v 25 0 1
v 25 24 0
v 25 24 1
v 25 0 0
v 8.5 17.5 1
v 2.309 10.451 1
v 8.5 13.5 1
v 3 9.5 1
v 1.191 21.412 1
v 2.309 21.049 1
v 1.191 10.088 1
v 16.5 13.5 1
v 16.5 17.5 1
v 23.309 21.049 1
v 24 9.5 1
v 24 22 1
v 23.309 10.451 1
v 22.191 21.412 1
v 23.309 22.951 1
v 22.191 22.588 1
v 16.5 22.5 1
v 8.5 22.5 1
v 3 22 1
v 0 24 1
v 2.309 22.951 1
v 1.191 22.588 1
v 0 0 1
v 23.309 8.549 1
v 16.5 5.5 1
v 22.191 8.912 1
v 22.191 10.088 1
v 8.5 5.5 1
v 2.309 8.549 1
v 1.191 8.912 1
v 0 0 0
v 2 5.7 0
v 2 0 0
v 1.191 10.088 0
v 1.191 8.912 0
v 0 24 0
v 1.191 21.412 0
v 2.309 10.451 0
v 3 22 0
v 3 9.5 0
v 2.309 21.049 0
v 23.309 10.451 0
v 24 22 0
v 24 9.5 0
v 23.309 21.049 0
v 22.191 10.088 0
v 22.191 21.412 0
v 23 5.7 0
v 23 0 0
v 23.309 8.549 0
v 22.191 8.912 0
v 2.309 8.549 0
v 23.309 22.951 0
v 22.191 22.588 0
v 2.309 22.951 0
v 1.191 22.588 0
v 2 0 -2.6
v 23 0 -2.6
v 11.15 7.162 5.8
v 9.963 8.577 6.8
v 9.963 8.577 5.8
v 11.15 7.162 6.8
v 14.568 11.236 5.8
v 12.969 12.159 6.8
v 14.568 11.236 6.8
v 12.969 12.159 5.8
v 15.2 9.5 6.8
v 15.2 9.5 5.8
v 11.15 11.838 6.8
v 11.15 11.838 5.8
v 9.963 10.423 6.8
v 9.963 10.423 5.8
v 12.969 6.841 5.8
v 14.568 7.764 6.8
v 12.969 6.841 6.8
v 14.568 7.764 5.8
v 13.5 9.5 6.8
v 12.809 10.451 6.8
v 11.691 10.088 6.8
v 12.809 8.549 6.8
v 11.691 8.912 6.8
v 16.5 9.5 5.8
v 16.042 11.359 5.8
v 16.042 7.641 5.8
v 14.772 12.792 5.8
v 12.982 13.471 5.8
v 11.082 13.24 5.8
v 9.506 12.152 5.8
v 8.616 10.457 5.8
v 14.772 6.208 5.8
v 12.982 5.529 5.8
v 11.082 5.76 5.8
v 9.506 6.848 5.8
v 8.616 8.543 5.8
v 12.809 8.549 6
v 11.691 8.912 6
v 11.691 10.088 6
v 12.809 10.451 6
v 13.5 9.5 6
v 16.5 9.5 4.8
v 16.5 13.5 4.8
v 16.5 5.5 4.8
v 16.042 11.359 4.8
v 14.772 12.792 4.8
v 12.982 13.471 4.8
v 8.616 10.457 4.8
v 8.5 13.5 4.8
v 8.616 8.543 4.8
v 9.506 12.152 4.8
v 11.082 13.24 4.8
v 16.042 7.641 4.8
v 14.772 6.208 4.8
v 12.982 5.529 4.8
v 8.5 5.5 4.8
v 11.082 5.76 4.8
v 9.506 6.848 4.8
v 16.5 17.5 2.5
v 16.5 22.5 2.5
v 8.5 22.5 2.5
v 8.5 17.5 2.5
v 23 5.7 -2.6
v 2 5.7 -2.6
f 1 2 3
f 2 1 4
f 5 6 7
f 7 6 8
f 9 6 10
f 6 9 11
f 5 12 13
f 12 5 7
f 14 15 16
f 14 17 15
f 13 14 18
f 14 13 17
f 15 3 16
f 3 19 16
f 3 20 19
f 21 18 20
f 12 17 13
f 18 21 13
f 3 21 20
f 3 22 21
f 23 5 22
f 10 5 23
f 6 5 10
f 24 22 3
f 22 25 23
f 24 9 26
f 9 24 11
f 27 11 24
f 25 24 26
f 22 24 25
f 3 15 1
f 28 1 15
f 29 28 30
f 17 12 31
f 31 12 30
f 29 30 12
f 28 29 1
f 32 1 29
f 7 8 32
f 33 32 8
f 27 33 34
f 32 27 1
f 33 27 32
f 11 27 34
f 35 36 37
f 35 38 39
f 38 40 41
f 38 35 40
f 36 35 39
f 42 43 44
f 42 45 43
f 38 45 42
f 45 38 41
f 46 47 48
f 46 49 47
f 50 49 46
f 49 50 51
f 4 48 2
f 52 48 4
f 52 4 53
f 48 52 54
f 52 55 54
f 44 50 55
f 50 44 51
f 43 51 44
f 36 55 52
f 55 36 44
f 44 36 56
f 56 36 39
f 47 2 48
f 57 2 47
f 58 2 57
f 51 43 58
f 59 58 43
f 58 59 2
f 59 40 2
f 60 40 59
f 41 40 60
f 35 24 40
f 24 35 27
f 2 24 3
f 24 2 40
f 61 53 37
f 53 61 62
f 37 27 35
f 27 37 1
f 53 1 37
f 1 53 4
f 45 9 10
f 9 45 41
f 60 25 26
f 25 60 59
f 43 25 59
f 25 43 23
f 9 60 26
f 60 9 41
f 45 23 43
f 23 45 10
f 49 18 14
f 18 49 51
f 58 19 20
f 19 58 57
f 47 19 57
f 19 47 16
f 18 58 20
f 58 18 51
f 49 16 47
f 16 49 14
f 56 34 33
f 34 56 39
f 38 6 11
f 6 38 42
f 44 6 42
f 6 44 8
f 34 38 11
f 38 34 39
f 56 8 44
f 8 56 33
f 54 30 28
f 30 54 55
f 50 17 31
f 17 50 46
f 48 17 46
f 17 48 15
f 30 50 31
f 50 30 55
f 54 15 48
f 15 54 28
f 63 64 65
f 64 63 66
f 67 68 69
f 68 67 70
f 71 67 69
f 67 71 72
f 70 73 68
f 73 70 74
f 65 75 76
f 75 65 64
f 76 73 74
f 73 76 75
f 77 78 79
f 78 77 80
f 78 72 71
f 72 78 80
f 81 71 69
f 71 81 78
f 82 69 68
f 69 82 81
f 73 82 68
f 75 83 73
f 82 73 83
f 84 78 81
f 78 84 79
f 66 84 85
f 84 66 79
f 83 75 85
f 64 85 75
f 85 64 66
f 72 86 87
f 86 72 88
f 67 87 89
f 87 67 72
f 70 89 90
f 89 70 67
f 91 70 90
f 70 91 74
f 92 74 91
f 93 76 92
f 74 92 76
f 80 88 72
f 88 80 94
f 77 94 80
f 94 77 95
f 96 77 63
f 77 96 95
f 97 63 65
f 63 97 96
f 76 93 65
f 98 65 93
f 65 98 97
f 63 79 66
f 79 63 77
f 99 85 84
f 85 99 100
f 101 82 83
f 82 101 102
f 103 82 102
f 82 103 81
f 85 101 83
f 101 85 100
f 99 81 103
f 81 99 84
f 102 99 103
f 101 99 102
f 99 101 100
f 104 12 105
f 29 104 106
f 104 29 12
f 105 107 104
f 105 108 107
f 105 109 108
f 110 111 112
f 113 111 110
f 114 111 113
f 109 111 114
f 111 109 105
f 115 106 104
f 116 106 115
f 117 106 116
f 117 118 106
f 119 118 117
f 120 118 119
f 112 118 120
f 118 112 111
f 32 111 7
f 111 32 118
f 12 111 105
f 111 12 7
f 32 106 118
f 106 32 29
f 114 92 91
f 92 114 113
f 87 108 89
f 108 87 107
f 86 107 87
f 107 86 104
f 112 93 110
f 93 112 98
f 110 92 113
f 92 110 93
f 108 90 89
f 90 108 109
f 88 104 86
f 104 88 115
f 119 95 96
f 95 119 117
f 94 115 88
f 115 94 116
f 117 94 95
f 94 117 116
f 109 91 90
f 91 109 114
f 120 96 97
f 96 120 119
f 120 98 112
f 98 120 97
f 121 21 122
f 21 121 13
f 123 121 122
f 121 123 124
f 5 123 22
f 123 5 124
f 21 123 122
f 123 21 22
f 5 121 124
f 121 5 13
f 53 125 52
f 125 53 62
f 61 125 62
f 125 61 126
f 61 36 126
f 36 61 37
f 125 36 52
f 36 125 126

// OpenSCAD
module PiCamera_1_3() {
    // Leiterplatte
    difference() {
        // Grundplatte
        cube([25, 24, 1]);
        // Löcher
        translate([2, 22, -1]) cylinder(3, 1, 1);
        translate([23, 22, -1]) cylinder(3, 1, 1);
        translate([2, 9.5, -1]) cylinder(3, 1, 1);
        translate([23, 9.5, -1]) cylinder(3, 1, 1);
    }

    // Kamerabox
    translate([8.5, 5.5, 1]) cube([8, 8, 3.8]);

    // Objektivhalter
    translate([12.5, 9.5, 4.8]) cylinder(1, 4, 4);

    // Objektiv
    difference() {
        translate([12.5, 9.5, 5.8]) cylinder(1, 2.7, 2.7);
        translate([12.5, 9.5, 6]) cylinder(1, 1, 1);
    }

    // Objektivanschluss
    translate([8.5, 17.5, 1]) cube([8, 5, 1.5]);

    // Kabelanschluss
    translate([2, 0, -2.6]) cube([21, 5.7, 2.6]);
}

PiCamera_1_3();
